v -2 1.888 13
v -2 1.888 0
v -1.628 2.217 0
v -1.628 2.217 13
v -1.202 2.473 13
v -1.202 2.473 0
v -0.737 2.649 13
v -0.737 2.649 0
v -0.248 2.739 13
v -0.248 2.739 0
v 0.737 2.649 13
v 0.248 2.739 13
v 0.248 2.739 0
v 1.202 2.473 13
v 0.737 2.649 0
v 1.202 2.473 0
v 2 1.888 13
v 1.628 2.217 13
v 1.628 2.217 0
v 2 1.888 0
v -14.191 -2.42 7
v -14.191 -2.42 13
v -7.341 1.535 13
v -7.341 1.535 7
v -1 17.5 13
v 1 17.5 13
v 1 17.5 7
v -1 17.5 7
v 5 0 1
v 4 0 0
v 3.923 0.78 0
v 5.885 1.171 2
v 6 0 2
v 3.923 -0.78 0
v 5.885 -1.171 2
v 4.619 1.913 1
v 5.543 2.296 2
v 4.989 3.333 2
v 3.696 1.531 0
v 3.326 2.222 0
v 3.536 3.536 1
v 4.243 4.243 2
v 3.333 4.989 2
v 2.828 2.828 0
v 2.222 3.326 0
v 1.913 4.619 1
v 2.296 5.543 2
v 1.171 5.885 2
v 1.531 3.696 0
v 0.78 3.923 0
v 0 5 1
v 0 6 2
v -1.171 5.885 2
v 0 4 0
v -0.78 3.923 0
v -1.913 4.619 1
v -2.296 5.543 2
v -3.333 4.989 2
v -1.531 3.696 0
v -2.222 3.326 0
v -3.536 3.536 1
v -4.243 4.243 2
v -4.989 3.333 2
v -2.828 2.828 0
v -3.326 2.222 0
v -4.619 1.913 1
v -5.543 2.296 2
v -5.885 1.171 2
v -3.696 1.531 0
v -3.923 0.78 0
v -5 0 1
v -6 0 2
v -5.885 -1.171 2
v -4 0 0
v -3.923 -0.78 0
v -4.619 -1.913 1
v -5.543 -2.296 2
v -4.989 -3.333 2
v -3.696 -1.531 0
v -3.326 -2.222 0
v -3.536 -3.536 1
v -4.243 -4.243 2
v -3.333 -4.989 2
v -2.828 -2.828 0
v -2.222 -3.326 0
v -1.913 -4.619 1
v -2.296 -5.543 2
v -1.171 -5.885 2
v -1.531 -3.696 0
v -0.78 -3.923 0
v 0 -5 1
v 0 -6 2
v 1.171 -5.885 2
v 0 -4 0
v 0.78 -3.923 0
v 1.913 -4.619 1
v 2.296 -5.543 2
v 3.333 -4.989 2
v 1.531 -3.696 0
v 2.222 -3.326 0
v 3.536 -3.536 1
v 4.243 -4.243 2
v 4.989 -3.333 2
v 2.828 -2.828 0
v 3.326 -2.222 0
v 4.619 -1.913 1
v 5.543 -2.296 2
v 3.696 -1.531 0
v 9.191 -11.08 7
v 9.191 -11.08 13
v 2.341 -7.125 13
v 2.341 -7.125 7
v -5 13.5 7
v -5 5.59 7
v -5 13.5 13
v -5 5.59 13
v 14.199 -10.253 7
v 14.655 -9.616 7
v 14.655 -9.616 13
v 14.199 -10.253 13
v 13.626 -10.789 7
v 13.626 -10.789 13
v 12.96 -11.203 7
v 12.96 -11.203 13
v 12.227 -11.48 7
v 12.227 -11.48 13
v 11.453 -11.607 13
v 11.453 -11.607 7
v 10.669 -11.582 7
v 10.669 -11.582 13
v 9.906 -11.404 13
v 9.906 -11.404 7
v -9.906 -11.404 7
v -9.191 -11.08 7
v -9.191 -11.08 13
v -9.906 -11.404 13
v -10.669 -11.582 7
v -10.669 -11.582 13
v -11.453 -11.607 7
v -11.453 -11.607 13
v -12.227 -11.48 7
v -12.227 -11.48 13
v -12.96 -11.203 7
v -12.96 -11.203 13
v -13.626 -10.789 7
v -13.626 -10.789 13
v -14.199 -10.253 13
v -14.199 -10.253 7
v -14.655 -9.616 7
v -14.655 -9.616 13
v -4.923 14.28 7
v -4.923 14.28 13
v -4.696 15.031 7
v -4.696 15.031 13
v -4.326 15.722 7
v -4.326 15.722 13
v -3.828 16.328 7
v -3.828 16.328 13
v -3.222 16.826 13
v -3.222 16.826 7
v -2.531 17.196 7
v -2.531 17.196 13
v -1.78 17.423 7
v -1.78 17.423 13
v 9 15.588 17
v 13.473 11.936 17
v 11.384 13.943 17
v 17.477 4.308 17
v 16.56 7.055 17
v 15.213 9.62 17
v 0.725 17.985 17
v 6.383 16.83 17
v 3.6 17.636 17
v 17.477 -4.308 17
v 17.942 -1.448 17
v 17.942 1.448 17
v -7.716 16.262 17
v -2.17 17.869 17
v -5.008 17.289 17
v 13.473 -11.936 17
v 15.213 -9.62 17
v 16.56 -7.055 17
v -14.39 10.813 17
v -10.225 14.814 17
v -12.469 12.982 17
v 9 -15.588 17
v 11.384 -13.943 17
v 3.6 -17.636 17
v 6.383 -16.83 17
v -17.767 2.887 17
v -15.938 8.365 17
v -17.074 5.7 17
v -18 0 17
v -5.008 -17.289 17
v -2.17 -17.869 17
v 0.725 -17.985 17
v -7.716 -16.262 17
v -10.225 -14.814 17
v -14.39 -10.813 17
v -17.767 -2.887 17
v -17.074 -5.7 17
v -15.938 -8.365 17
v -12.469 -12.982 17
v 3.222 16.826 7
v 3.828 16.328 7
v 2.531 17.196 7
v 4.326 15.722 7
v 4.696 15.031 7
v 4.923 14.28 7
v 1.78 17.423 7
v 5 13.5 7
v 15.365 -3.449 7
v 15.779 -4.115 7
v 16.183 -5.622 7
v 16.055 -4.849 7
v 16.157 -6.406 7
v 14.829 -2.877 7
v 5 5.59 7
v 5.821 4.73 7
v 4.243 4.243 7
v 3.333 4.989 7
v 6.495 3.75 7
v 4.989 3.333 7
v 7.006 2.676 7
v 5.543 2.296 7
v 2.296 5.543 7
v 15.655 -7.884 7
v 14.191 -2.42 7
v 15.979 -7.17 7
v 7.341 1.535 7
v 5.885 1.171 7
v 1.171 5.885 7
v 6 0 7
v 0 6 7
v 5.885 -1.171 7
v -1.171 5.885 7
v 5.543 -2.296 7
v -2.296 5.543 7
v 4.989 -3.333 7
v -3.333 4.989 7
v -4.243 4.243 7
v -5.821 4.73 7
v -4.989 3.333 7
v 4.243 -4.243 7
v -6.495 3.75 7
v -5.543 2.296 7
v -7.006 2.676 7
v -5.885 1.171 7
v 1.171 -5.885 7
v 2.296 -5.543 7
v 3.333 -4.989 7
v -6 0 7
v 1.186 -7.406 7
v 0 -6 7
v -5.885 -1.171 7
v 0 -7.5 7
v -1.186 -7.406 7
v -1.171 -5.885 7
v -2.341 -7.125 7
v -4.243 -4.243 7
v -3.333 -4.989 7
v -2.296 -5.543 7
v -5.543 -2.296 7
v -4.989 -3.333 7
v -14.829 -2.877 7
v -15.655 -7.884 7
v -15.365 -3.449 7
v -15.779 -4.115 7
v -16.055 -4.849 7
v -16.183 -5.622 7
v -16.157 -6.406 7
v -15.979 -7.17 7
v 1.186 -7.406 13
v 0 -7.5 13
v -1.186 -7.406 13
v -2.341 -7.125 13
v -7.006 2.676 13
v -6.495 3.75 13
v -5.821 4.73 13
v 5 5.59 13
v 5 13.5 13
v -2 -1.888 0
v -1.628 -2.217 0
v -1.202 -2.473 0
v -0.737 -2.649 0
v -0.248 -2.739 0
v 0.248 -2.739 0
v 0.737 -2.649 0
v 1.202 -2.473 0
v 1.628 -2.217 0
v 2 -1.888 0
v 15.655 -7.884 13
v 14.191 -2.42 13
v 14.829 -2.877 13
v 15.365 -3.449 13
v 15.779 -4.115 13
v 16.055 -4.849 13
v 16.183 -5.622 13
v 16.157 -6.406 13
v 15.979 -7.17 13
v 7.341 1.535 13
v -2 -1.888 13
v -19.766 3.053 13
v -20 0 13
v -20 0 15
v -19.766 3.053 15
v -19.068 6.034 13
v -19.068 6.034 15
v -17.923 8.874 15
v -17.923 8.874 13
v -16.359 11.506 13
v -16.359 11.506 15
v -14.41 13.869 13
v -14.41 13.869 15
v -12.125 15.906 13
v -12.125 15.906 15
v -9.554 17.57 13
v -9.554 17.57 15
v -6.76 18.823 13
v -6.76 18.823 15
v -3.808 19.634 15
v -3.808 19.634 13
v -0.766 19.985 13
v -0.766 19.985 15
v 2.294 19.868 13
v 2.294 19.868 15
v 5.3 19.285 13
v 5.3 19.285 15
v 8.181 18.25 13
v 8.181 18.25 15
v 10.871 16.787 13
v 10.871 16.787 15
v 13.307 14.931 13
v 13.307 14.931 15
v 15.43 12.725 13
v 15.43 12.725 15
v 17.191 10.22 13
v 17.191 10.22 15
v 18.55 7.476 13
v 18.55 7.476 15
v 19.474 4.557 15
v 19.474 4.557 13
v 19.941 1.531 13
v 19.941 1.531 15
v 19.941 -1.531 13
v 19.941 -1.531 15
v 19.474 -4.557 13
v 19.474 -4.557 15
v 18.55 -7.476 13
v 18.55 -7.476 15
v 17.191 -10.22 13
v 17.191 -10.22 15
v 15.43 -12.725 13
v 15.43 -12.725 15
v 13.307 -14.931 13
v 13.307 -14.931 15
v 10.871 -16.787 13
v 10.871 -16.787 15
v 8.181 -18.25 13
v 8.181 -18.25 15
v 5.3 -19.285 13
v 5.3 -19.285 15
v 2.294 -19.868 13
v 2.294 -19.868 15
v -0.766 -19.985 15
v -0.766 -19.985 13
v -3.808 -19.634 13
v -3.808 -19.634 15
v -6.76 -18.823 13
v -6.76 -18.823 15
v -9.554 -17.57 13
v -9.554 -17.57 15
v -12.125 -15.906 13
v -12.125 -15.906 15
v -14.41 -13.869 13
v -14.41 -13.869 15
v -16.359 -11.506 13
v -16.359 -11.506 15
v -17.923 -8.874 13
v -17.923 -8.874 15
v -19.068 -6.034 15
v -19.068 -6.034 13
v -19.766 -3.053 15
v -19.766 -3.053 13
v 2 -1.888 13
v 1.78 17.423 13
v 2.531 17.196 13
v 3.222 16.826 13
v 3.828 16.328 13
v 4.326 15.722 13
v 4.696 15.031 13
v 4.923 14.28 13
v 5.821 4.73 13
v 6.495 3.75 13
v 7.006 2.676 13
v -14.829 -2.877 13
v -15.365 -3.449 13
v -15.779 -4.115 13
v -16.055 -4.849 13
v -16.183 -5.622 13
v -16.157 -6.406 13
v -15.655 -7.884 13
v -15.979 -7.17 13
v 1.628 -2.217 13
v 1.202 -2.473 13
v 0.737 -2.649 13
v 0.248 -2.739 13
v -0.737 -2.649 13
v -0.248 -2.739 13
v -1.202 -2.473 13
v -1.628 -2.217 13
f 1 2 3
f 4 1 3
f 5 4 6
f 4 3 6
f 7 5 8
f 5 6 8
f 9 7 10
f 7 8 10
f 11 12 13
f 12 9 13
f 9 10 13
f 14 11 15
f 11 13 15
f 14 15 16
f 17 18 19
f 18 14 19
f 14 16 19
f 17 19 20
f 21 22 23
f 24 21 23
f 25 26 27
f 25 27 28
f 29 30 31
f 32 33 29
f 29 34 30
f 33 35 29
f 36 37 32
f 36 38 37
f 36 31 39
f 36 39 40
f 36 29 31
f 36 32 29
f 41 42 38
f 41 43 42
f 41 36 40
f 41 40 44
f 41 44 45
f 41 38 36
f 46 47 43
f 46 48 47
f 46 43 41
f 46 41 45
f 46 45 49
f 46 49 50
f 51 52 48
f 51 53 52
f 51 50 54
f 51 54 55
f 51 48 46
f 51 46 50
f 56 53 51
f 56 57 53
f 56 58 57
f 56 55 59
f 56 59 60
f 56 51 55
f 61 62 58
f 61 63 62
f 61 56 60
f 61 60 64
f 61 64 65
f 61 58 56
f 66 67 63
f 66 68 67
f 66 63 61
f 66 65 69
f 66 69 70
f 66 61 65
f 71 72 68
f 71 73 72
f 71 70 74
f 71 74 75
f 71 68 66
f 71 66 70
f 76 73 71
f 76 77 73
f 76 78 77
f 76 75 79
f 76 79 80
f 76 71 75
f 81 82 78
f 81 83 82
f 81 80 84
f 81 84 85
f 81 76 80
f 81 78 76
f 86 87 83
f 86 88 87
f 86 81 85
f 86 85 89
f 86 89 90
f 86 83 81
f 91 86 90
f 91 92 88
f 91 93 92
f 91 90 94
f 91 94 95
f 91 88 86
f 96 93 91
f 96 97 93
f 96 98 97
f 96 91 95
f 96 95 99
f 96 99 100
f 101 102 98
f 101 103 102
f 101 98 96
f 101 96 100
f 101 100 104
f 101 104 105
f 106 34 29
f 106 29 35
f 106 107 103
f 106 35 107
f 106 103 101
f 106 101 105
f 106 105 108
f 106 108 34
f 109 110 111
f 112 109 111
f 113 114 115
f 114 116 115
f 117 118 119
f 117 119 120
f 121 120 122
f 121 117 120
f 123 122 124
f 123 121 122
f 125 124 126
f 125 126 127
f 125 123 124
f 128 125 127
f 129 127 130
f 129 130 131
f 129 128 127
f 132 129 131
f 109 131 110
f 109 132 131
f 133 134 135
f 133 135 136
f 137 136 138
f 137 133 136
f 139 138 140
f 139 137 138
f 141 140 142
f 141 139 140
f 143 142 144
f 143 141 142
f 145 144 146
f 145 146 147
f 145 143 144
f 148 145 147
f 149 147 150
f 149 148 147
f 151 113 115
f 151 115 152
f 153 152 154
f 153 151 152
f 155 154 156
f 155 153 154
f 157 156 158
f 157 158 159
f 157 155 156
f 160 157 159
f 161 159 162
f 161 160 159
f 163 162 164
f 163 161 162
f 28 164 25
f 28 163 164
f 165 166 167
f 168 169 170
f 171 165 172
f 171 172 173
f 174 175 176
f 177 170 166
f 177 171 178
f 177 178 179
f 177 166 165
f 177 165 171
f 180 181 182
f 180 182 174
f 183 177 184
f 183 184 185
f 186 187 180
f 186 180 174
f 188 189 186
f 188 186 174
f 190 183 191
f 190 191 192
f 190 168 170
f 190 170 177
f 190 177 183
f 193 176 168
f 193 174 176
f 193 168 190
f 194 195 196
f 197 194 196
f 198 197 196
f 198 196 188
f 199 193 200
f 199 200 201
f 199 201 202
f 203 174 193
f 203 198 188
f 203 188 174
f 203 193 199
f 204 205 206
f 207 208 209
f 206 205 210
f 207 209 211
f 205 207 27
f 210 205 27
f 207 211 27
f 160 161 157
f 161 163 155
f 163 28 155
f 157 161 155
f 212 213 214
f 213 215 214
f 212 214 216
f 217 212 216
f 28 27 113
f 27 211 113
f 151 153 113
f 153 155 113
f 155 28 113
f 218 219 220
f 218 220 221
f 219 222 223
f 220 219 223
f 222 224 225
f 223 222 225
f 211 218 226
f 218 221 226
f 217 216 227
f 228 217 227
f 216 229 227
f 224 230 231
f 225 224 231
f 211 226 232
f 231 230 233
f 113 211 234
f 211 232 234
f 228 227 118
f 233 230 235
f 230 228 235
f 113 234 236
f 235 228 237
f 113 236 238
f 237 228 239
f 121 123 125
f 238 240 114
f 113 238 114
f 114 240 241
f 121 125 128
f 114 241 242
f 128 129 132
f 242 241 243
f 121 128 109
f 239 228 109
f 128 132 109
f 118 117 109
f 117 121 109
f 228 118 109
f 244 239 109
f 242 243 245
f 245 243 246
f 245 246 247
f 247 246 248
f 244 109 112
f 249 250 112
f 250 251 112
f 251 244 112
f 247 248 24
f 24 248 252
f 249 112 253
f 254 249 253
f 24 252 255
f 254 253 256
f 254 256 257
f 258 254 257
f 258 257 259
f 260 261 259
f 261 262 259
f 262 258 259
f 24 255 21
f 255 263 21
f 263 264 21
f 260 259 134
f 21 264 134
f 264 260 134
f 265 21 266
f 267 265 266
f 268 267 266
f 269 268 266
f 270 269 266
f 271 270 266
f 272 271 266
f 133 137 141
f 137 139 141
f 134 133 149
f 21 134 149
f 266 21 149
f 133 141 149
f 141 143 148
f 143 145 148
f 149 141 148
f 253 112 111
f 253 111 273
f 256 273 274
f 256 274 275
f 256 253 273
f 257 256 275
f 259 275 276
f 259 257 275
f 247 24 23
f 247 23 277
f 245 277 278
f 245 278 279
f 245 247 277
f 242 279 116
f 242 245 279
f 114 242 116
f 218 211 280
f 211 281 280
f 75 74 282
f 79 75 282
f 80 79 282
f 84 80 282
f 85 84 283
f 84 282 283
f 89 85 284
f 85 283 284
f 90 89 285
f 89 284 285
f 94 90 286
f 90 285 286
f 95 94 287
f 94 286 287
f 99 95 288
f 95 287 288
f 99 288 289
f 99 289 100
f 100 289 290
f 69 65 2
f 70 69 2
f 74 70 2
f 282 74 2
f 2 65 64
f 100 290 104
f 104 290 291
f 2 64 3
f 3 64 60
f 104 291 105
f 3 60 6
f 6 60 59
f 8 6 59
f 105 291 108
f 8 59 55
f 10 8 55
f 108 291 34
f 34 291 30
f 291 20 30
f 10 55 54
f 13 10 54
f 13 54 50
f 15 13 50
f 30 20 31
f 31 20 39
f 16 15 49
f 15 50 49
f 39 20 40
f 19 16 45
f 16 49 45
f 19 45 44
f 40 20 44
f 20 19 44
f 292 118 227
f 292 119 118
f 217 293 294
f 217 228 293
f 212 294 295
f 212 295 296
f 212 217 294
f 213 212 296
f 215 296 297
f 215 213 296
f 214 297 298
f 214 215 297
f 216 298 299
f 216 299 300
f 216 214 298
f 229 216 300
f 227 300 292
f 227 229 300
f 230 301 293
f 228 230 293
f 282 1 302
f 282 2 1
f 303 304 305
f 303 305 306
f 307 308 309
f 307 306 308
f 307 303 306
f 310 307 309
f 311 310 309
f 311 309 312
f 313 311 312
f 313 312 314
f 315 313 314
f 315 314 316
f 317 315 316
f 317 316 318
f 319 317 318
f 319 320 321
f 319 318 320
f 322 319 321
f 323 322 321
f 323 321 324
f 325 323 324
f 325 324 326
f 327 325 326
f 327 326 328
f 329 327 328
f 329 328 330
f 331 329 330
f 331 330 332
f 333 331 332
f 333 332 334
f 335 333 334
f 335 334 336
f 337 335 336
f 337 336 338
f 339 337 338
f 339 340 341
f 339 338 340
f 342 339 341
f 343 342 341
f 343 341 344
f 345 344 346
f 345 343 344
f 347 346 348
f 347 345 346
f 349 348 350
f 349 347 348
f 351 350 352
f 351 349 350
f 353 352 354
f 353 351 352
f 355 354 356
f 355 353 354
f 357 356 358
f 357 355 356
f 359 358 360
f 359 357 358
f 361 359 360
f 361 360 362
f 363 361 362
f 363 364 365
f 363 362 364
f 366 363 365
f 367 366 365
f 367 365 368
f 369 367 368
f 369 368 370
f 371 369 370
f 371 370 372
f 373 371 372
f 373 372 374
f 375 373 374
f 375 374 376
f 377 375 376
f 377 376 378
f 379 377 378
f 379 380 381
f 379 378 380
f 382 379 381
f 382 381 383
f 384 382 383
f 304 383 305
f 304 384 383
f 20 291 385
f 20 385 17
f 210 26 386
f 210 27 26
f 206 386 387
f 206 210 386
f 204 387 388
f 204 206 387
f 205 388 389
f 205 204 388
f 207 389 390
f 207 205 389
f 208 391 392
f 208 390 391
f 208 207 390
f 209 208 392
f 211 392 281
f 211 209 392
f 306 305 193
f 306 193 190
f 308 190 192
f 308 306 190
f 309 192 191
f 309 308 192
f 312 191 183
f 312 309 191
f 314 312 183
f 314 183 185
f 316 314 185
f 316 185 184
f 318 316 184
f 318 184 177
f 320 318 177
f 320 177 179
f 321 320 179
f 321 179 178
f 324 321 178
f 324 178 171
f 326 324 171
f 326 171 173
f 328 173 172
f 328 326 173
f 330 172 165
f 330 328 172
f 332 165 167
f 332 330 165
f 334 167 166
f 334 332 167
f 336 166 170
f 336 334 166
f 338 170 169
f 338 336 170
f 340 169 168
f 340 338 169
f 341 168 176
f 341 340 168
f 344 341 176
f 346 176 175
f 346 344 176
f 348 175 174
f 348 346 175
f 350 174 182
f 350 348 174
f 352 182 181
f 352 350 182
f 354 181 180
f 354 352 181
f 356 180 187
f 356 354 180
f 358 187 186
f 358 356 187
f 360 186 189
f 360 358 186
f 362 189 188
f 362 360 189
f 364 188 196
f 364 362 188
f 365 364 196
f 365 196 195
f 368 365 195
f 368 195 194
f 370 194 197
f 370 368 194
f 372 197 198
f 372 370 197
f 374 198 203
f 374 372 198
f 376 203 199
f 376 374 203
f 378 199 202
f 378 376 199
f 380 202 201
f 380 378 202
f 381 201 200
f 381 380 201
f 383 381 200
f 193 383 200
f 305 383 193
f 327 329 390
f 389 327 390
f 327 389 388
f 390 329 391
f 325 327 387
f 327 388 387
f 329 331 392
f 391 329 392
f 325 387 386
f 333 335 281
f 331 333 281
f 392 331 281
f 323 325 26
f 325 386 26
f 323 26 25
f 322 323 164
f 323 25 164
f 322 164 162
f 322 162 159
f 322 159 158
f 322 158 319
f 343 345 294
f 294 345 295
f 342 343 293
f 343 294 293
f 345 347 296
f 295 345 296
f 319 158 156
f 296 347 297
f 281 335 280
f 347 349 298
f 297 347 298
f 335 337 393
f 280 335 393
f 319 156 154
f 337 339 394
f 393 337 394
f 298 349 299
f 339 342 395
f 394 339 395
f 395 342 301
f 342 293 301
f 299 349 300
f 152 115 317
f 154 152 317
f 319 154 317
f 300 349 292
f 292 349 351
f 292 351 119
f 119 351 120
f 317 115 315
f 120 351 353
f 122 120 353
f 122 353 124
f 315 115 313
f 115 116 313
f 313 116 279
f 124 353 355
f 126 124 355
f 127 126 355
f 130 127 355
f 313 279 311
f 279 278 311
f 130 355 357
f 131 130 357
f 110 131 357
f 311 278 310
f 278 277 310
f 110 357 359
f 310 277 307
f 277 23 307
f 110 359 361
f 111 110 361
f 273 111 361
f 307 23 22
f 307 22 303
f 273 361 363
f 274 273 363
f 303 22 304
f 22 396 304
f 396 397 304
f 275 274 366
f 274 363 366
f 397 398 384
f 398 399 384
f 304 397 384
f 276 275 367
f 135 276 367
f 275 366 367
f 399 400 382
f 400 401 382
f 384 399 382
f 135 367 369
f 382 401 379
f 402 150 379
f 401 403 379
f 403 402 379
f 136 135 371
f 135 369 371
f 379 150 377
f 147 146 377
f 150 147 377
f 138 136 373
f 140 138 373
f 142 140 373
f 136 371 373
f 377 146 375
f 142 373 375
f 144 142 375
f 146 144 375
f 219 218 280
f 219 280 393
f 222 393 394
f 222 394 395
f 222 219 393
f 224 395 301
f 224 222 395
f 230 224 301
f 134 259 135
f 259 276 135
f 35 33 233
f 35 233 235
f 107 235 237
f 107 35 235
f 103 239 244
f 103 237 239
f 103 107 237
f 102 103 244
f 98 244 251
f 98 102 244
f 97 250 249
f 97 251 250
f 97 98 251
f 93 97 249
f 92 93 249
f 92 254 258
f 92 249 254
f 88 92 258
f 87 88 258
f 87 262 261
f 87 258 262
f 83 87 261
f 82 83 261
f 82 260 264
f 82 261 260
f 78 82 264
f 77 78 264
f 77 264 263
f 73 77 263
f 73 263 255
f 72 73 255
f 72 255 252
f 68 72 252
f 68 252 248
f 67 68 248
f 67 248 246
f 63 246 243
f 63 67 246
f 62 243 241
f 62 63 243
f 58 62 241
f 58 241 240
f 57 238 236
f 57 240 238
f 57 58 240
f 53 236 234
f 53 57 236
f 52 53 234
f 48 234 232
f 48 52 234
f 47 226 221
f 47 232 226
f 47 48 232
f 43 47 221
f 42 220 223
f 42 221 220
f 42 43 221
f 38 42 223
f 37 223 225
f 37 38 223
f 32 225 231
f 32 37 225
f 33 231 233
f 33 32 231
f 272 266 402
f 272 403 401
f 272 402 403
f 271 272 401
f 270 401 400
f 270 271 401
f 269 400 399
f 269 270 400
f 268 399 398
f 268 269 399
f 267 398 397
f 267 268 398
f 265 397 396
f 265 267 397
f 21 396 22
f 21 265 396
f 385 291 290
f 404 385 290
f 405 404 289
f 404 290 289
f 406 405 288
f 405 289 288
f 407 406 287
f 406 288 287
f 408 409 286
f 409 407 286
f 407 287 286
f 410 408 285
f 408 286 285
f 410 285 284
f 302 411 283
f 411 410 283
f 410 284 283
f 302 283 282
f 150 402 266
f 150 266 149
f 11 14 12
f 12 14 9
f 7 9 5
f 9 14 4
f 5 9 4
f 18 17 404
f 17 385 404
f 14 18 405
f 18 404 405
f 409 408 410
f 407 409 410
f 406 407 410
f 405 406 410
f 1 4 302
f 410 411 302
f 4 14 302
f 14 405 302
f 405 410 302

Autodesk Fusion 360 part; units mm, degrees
sketch "Sketch1" plane through (0, 0, 0) normal (0, 0, 1) x (1, 0, 0)
  line L0 (-2, 1.8875) -> (-2, -1.8875)
  line L1 (2, -1.8875) -> (2, 1.8875)
  line L2 (1.0213, 2.5533) -> (-1.0213, -2.5533) construction
  line L3 (-1.0213, 2.5533) -> (1.0213, -2.5533) construction
  arc A0 (2, 1.8875) -> (-2, 1.8875) centre (0, 0) ccw
  arc A1 (-2, -1.8875) -> (2, -1.8875) centre (0, 0) ccw
  circle A2 centre (0, 0) radius 6
  dimension "d1" = 5.5
  dimension "d4" = 12
extrude "Extrude1" add sketch "Sketch1" along normal blind 7
chamfer "Chamfer1" distance 2 angle 45 1 edges at (-5.594, -2.1697, 0)
sketch "Sketch2" plane through (0, 0, 7) normal (0, 0, 1) x (-1, 0, 0)
  arc A0 (2, 1.8875) -> (-2, 1.8875) centre (0, 0) ccw
  line L0 (2, 1.8875) -> (2, -1.8875)
  arc A1 (-2, -1.8875) -> (2, -1.8875) centre (0, 0) ccw
  line L1 (-2, -1.8875) -> (-2, 1.8875)
  circle A2 centre (0, 0) radius 6
  circle A3 centre (0, 0) radius 7.5
  dimension "d8" = 15
extrude "Extrude2" add sketch "Sketch2" along normal blind 6 contours A2 | A3
sketch "Sketch3" plane through (0, 0, 13) normal (0, 0, 1) x (-1, 0, 0)
  arc A0 (2, 1.8875) -> (-2, 1.8875) centre (0, 0) ccw
  line L0 (2, 1.8875) -> (2, -1.8875)
  arc A1 (-2, -1.8875) -> (2, -1.8875) centre (0, 0) ccw
  line L1 (-2, -1.8875) -> (-2, 1.8875)
  circle A2 centre (0, 0) radius 7.5
  line L2 (0, -7.5) -> (0, -17.5) construction
  line L3 (0, -17.5) -> (5, -17.5) construction
  line L4 (5, -17.5) -> (-5, -17.5) construction
  line L5 (-5, -17.5) -> (-5, -5.5902) construction
  line L6 (5, -17.5) -> (5, -5.5902) construction
  line L7 (5, -5.5902) -> (5, -17.5)
  line L8 (-5, -17.5) -> (-5, -5.5902)
  line L9 (-5, -17.5) -> (5, -17.5)
  line L10 (17.6554, 4.4199) -> (7.3412, -1.535)
  line L11 (17.6554, 4.4199) -> (12.6554, 13.0801)
  line L12 (12.6554, 13.0801) -> (2.3412, 7.1252) construction
  line L13 (-12.6554, 13.0801) -> (-2.3412, 7.1252)
  line L14 (-12.6554, 13.0801) -> (-17.6554, 4.4199)
  line L15 (-17.6554, 4.4199) -> (-7.3412, -1.535) construction
  line L16 (-7.3412, -1.535) -> (-17.6554, 4.4199)
  line L17 (2.3412, 7.1252) -> (12.6554, 13.0801)
  dimension "d11" = 10
  dimension "d12" = 5
  dimension "d18" = 360
extrude "Extrude3" add sketch "Sketch3" against normal blind 6 contours A2 L7 L8 L9
fillet "Fillet1" radius 5 2 edges at (5, 17.5, 10) (-5, 17.5, 10)
extrude "Extrude4" add sketch "Sketch3" against normal blind 6 contours A2 L10 L11 L17 | A2 L13 L14 L16 | A2 L7 L8 L9
fillet "Fillet2" radius 4 6 edges at (-5, 17.5, 10) (5, 17.5, 10) (17.6554, -4.4199, 10) (12.6554, -13.0801, 10) (-12.6554, -13.0801, 10) (-17.6554, -4.4199, 10)
sketch "Sketch4" plane through (0, 0, 13) normal (0, 0, 1) x (-1, 0, 0)
  arc A0 (14.1913, 2.4199) -> (15.6554, 7.884) centre (12.1913, 5.884) ccw
  line L0 (15.6554, 7.884) -> (14.6554, 9.616)
  arc A1 (14.6554, 9.616) -> (9.1913, 11.0801) centre (11.1913, 7.616) ccw
  line L1 (9.1913, 11.0801) -> (2.3412, 7.1252)
  arc A2 (2.3412, 7.1252) -> (-2.3412, 7.1252) centre (0, 0) ccw
  line L2 (-2.3412, 7.1252) -> (-9.1913, 11.0801)
  arc A3 (-9.1913, 11.0801) -> (-14.6554, 9.616) centre (-11.1913, 7.616) ccw
  line L3 (-14.6554, 9.616) -> (-15.6554, 7.884)
  arc A4 (-15.6554, 7.884) -> (-14.1913, 2.4199) centre (-12.1913, 5.884) ccw
  line L4 (-14.1913, 2.4199) -> (-7.3412, -1.535)
  arc A5 (-7.3412, -1.535) -> (-5, -5.5902) centre (0, 0) ccw
  line L5 (-5, -5.5902) -> (-5, -13.5)
  arc A6 (-5, -13.5) -> (-1, -17.5) centre (-1, -13.5) ccw
  line L6 (-1, -17.5) -> (1, -17.5)
  arc A7 (1, -17.5) -> (5, -13.5) centre (1, -13.5) ccw
  line L7 (5, -13.5) -> (5, -5.5902)
  arc A8 (5, -5.5902) -> (7.3412, -1.535) centre (0, 0) ccw
  line L8 (7.3412, -1.535) -> (14.1913, 2.4199)
  arc A9 (2, 1.8875) -> (-2, 1.8875) centre (0, 0) ccw
  line L9 (2, 1.8875) -> (2, -1.8875)
  arc A10 (-2, -1.8875) -> (2, -1.8875) centre (0, 0) ccw
  line L10 (-2, -1.8875) -> (-2, 1.8875)
  circle A11 centre (0, 0) radius 20
  dimension "d23" = 40
extrude "Extrude5" add sketch "Sketch4" along normal blind 4 contours A0 L0 A1 L1 A2 L2 A3 L3 A4 L4 A5 L5 A6 L6 A7 L7 A8 L8 | A9 L9 A10 L10 | A11
chamfer "Chamfer2" distance 2 angle 45 1 edges at (18.6465, 7.2323, 17)
sketch "Sketch5" plane through (0, 0, 7) normal (0, 0, -1) x (1, 0, 0)
  arc A0 (-15.6554, 7.884) -> (-14.1913, 2.4199) centre (-12.1913, 5.884) ccw
  line L0 (-14.1913, 2.4199) -> (-7.3412, -1.535)
  arc A1 (-7.3412, -1.535) -> (-5, -5.5902) centre (0, 0) ccw
  line L1 (-5, -5.5902) -> (-5, -13.5)
  arc A2 (-5, -13.5) -> (-1, -17.5) centre (-1, -13.5) ccw
  line L2 (-1, -17.5) -> (1, -17.5)
  arc A3 (1, -17.5) -> (5, -13.5) centre (1, -13.5) ccw
  line L3 (5, -13.5) -> (5, -5.5902)
  arc A4 (5, -5.5902) -> (7.3412, -1.535) centre (0, 0) ccw
  line L4 (7.3412, -1.535) -> (14.1913, 2.4199)
  arc A5 (14.1913, 2.4199) -> (15.6554, 7.884) centre (12.1913, 5.884) ccw
  line L5 (15.6554, 7.884) -> (14.6554, 9.616)
  arc A6 (14.6554, 9.616) -> (9.1913, 11.0801) centre (11.1913, 7.616) ccw
  line L6 (9.1913, 11.0801) -> (2.3412, 7.1252)
  arc A7 (2.3412, 7.1252) -> (-2.3412, 7.1252) centre (0, 0) ccw
  line L7 (-2.3412, 7.1252) -> (-9.1913, 11.0801)
  arc A8 (-9.1913, 11.0801) -> (-14.6554, 9.616) centre (-11.1913, 7.616) ccw
  line L8 (-14.6554, 9.616) -> (-15.6554, 7.884)
  circle A9 centre (0, 0) radius 6
